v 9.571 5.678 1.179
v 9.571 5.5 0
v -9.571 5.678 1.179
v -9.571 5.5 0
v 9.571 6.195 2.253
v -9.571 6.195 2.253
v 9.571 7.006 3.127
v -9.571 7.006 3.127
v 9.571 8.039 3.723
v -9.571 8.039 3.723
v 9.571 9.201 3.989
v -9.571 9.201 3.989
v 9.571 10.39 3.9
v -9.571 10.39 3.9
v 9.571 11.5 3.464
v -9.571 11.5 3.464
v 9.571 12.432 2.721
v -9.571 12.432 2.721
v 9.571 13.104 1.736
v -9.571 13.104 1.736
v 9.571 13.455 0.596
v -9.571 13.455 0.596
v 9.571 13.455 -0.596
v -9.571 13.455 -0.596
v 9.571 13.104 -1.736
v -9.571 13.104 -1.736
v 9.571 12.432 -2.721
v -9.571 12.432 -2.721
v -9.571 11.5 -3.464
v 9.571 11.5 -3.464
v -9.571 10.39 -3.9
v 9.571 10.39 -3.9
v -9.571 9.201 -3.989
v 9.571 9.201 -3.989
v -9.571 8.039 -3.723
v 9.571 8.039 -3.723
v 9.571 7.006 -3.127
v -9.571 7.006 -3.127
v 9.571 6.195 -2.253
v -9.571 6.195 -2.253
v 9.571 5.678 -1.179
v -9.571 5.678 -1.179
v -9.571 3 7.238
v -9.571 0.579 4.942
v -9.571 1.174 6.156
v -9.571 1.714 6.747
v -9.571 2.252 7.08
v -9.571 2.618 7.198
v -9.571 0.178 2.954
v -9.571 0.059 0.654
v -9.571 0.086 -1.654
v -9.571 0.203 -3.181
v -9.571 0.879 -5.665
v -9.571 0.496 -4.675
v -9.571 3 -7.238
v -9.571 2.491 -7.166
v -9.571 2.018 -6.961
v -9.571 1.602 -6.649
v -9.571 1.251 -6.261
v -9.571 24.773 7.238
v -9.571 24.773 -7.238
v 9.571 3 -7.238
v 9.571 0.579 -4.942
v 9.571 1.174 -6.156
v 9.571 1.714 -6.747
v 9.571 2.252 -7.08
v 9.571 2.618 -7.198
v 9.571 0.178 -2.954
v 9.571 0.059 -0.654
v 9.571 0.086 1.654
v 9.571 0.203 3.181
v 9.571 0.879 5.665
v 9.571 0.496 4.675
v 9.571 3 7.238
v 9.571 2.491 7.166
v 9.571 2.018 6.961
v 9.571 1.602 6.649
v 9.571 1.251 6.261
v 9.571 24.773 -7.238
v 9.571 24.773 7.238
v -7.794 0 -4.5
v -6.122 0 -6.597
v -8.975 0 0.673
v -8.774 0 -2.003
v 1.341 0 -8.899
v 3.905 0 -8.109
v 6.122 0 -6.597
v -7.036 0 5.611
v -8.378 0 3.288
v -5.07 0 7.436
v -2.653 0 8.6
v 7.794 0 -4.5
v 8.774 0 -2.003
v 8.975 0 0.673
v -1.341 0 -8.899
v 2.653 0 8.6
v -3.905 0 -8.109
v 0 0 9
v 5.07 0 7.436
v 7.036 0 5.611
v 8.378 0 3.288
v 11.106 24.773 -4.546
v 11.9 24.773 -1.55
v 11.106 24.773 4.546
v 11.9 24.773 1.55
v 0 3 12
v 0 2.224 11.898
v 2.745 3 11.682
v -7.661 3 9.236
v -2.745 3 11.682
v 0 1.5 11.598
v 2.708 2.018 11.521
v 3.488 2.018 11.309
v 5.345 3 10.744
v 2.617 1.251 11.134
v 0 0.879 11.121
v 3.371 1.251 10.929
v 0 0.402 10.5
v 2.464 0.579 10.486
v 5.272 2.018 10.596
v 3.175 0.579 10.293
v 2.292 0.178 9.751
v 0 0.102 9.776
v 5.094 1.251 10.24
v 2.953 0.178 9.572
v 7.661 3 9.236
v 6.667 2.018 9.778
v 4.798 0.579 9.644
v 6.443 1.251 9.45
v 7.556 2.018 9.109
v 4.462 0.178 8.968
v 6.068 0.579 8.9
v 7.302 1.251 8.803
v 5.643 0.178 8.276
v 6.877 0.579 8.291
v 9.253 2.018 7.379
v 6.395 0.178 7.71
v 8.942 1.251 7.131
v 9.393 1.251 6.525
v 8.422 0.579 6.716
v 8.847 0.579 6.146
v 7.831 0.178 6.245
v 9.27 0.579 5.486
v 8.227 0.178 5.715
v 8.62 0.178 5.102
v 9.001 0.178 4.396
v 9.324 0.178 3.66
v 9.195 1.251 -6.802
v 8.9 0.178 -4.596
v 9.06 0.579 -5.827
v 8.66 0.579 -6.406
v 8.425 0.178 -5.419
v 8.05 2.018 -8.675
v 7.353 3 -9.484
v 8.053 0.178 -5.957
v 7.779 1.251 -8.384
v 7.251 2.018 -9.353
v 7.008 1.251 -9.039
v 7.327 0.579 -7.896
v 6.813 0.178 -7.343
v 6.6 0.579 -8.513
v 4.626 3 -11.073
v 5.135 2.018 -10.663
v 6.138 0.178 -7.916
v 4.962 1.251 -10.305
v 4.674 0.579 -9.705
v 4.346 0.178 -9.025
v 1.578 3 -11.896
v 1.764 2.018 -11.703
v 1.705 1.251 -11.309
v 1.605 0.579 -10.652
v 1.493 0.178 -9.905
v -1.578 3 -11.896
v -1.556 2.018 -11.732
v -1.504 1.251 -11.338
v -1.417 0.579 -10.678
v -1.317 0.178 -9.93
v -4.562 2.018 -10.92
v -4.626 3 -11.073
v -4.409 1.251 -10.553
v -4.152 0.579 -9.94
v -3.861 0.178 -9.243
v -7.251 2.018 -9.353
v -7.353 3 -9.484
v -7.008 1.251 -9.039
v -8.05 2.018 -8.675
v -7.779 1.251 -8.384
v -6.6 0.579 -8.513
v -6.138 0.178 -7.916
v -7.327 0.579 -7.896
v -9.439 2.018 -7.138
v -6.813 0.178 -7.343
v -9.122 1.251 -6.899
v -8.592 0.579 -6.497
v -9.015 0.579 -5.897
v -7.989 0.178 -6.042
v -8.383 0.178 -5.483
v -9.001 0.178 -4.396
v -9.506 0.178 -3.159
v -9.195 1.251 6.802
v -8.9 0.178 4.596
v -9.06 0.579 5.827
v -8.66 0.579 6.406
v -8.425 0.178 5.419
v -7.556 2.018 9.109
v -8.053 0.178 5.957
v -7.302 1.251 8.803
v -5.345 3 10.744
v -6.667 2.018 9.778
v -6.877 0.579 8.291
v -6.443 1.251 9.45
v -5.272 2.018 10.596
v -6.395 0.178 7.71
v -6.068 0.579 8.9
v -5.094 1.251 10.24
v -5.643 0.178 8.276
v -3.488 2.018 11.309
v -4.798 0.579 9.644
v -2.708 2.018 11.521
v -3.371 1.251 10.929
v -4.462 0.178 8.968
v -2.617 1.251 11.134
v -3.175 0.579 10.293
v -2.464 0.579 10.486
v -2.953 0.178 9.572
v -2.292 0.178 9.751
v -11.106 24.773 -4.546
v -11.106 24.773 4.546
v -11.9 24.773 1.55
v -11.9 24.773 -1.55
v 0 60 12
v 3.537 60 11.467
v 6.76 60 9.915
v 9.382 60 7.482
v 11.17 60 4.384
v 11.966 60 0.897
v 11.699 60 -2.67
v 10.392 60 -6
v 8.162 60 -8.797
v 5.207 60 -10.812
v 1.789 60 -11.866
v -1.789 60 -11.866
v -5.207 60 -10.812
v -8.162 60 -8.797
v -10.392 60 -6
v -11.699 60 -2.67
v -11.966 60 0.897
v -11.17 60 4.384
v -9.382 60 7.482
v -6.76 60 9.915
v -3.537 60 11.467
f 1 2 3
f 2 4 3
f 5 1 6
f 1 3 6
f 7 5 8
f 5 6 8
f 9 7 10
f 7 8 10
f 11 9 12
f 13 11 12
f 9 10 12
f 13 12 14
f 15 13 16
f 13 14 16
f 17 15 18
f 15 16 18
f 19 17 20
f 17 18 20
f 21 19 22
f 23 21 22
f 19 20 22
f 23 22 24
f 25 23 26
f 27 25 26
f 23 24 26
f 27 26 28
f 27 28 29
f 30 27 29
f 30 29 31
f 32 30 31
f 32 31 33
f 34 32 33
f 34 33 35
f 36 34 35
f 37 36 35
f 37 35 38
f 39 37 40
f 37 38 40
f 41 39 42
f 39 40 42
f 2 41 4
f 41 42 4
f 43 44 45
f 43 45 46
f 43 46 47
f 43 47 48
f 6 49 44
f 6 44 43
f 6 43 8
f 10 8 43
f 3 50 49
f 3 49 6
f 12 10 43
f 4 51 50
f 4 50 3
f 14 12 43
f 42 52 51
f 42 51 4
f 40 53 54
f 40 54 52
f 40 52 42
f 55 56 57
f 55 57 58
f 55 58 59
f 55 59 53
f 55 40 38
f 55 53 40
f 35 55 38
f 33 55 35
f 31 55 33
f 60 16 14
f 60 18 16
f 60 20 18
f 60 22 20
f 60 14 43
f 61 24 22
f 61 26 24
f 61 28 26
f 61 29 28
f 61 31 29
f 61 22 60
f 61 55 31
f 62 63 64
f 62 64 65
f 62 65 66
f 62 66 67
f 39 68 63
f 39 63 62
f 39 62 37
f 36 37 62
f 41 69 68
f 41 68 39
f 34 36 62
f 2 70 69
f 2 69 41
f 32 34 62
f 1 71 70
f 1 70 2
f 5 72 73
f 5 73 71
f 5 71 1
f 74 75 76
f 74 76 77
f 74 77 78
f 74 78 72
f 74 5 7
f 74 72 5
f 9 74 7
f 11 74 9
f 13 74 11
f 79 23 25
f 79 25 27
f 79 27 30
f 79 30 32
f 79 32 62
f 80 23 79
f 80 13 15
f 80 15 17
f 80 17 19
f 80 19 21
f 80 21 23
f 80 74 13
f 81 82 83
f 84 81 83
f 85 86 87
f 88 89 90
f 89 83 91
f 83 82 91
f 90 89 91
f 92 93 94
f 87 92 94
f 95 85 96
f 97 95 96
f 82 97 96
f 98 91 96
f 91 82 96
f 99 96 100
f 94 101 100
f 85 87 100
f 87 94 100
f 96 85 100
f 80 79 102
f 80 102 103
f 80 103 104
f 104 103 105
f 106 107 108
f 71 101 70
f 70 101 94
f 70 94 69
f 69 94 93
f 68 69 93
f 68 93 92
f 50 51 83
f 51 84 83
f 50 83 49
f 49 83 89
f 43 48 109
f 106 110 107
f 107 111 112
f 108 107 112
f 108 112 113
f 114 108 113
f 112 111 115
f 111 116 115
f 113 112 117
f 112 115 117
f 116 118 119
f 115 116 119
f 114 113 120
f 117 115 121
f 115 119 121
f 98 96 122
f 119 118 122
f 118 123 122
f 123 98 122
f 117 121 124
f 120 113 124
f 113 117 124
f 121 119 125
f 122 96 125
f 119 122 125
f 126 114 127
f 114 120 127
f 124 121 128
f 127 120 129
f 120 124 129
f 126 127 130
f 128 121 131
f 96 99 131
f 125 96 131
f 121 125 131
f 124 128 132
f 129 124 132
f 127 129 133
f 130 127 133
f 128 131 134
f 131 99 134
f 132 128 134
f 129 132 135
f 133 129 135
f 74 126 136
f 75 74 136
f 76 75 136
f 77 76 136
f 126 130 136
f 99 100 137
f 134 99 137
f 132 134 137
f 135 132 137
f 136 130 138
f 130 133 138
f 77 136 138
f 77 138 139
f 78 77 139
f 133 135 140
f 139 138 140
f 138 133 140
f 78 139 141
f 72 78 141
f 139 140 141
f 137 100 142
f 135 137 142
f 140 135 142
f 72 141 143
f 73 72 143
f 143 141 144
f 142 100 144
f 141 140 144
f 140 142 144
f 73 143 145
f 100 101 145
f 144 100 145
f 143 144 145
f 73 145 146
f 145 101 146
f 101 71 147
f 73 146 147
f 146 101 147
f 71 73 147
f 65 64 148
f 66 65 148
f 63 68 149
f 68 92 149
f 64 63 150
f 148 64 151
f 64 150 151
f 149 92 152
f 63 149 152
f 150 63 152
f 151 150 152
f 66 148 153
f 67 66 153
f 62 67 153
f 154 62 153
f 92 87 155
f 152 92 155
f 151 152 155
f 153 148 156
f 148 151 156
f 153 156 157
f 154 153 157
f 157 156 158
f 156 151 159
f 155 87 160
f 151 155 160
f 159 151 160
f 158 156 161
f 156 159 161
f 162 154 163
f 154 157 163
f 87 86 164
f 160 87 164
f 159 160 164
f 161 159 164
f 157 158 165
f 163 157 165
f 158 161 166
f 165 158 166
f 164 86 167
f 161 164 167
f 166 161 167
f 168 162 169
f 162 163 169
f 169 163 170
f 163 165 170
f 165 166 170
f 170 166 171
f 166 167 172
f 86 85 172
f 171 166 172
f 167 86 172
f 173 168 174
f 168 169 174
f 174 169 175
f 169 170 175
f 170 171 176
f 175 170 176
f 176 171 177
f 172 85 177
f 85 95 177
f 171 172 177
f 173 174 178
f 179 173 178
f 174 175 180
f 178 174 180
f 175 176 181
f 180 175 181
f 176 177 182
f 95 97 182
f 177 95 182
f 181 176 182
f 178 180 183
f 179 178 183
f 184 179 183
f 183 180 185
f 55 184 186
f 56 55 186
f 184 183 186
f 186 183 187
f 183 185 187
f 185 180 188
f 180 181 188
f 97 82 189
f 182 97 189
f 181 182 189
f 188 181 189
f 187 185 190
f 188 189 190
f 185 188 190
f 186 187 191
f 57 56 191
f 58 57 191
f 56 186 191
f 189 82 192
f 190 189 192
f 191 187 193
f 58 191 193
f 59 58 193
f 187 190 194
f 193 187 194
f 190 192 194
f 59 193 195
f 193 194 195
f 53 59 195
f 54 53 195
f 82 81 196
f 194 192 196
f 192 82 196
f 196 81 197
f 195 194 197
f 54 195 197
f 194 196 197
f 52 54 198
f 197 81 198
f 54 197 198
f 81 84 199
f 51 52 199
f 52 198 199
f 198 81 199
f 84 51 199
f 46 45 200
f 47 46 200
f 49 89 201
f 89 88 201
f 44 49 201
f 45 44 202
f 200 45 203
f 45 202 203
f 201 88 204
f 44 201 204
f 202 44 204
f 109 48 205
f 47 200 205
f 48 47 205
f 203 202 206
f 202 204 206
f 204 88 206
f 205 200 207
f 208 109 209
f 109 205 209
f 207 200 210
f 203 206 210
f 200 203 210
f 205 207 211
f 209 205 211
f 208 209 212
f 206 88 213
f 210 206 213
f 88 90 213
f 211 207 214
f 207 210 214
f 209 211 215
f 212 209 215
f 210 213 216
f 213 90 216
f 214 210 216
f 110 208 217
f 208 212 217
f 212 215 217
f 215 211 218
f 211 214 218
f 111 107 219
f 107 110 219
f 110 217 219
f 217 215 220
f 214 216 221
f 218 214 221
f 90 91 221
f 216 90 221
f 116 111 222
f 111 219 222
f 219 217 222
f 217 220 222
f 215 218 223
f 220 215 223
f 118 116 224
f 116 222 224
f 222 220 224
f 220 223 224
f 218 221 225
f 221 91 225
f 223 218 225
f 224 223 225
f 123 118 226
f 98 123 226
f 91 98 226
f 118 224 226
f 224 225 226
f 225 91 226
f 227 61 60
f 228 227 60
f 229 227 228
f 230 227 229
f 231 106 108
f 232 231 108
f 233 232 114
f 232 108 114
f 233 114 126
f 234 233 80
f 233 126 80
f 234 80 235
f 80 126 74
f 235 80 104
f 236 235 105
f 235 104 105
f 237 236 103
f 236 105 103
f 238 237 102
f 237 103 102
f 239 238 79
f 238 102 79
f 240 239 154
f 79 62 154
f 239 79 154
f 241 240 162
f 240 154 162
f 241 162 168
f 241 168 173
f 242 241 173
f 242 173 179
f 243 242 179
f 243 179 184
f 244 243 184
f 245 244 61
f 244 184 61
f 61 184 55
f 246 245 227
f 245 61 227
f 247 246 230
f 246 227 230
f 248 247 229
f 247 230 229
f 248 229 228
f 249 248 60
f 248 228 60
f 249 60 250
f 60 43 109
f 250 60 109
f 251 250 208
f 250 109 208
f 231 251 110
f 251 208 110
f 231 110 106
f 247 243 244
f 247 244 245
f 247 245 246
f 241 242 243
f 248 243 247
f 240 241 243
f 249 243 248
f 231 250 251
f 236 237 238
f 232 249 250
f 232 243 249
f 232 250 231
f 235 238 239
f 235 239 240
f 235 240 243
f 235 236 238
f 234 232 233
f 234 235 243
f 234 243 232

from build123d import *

# Parameters (mm, degrees)
SKETCH_1_R          = 12
EXTRUDE_1_DEPTH     = 60
FILLET_1_R          = 3
SKETCH_2_W          = 4.428763437
SKETCH_2_H          = 29.827900754
CUT_EXTRUDE_1_DEPTH = 40
SKETCH_6_R          = 4
CUT_EXTRUDE_2_DEPTH = 50


with BuildPart() as part:
    # Эскиз1 → Вытянуть1 (new body)
    with BuildSketch(Plane(origin=(0, 0, 0), x_dir=(1, 0, 0), z_dir=(0, 1, 0))):
        with Locations(Location((0, 0, 0), (0, 0, 270))):
            Circle(SKETCH_1_R)
    extrude(amount=EXTRUDE_1_DEPTH)

    # Скругление1
    fillet_1_edges = [part.edges().sort_by_distance(p)[0] for p in [
        (0, 0, -12),
    ]]
    fillet(fillet_1_edges, radius=FILLET_1_R)

    # Эскиз2 → Вырез-Вытянуть1 (cut, symmetric)
    with BuildSketch(Plane.XY):
        with Locations((-11.785618281, 9.858944965)):
            Rectangle(SKETCH_2_W, SKETCH_2_H)
        with Locations((11.785618281, 9.858944965)):
            Rectangle(SKETCH_2_W, SKETCH_2_H)
    extrude(amount=CUT_EXTRUDE_1_DEPTH, both=True, mode=Mode.SUBTRACT)

    # Эскиз6 → Вырез-Вытянуть2 (cut, symmetric)
    with BuildSketch(Plane.ZY.offset(9.571236563)):
        with Locations(Location((0, 9.5, 0), (0, 0, 270))):
            Circle(SKETCH_6_R)
    extrude(amount=CUT_EXTRUDE_2_DEPTH, both=True, mode=Mode.SUBTRACT)


solid = part.part
